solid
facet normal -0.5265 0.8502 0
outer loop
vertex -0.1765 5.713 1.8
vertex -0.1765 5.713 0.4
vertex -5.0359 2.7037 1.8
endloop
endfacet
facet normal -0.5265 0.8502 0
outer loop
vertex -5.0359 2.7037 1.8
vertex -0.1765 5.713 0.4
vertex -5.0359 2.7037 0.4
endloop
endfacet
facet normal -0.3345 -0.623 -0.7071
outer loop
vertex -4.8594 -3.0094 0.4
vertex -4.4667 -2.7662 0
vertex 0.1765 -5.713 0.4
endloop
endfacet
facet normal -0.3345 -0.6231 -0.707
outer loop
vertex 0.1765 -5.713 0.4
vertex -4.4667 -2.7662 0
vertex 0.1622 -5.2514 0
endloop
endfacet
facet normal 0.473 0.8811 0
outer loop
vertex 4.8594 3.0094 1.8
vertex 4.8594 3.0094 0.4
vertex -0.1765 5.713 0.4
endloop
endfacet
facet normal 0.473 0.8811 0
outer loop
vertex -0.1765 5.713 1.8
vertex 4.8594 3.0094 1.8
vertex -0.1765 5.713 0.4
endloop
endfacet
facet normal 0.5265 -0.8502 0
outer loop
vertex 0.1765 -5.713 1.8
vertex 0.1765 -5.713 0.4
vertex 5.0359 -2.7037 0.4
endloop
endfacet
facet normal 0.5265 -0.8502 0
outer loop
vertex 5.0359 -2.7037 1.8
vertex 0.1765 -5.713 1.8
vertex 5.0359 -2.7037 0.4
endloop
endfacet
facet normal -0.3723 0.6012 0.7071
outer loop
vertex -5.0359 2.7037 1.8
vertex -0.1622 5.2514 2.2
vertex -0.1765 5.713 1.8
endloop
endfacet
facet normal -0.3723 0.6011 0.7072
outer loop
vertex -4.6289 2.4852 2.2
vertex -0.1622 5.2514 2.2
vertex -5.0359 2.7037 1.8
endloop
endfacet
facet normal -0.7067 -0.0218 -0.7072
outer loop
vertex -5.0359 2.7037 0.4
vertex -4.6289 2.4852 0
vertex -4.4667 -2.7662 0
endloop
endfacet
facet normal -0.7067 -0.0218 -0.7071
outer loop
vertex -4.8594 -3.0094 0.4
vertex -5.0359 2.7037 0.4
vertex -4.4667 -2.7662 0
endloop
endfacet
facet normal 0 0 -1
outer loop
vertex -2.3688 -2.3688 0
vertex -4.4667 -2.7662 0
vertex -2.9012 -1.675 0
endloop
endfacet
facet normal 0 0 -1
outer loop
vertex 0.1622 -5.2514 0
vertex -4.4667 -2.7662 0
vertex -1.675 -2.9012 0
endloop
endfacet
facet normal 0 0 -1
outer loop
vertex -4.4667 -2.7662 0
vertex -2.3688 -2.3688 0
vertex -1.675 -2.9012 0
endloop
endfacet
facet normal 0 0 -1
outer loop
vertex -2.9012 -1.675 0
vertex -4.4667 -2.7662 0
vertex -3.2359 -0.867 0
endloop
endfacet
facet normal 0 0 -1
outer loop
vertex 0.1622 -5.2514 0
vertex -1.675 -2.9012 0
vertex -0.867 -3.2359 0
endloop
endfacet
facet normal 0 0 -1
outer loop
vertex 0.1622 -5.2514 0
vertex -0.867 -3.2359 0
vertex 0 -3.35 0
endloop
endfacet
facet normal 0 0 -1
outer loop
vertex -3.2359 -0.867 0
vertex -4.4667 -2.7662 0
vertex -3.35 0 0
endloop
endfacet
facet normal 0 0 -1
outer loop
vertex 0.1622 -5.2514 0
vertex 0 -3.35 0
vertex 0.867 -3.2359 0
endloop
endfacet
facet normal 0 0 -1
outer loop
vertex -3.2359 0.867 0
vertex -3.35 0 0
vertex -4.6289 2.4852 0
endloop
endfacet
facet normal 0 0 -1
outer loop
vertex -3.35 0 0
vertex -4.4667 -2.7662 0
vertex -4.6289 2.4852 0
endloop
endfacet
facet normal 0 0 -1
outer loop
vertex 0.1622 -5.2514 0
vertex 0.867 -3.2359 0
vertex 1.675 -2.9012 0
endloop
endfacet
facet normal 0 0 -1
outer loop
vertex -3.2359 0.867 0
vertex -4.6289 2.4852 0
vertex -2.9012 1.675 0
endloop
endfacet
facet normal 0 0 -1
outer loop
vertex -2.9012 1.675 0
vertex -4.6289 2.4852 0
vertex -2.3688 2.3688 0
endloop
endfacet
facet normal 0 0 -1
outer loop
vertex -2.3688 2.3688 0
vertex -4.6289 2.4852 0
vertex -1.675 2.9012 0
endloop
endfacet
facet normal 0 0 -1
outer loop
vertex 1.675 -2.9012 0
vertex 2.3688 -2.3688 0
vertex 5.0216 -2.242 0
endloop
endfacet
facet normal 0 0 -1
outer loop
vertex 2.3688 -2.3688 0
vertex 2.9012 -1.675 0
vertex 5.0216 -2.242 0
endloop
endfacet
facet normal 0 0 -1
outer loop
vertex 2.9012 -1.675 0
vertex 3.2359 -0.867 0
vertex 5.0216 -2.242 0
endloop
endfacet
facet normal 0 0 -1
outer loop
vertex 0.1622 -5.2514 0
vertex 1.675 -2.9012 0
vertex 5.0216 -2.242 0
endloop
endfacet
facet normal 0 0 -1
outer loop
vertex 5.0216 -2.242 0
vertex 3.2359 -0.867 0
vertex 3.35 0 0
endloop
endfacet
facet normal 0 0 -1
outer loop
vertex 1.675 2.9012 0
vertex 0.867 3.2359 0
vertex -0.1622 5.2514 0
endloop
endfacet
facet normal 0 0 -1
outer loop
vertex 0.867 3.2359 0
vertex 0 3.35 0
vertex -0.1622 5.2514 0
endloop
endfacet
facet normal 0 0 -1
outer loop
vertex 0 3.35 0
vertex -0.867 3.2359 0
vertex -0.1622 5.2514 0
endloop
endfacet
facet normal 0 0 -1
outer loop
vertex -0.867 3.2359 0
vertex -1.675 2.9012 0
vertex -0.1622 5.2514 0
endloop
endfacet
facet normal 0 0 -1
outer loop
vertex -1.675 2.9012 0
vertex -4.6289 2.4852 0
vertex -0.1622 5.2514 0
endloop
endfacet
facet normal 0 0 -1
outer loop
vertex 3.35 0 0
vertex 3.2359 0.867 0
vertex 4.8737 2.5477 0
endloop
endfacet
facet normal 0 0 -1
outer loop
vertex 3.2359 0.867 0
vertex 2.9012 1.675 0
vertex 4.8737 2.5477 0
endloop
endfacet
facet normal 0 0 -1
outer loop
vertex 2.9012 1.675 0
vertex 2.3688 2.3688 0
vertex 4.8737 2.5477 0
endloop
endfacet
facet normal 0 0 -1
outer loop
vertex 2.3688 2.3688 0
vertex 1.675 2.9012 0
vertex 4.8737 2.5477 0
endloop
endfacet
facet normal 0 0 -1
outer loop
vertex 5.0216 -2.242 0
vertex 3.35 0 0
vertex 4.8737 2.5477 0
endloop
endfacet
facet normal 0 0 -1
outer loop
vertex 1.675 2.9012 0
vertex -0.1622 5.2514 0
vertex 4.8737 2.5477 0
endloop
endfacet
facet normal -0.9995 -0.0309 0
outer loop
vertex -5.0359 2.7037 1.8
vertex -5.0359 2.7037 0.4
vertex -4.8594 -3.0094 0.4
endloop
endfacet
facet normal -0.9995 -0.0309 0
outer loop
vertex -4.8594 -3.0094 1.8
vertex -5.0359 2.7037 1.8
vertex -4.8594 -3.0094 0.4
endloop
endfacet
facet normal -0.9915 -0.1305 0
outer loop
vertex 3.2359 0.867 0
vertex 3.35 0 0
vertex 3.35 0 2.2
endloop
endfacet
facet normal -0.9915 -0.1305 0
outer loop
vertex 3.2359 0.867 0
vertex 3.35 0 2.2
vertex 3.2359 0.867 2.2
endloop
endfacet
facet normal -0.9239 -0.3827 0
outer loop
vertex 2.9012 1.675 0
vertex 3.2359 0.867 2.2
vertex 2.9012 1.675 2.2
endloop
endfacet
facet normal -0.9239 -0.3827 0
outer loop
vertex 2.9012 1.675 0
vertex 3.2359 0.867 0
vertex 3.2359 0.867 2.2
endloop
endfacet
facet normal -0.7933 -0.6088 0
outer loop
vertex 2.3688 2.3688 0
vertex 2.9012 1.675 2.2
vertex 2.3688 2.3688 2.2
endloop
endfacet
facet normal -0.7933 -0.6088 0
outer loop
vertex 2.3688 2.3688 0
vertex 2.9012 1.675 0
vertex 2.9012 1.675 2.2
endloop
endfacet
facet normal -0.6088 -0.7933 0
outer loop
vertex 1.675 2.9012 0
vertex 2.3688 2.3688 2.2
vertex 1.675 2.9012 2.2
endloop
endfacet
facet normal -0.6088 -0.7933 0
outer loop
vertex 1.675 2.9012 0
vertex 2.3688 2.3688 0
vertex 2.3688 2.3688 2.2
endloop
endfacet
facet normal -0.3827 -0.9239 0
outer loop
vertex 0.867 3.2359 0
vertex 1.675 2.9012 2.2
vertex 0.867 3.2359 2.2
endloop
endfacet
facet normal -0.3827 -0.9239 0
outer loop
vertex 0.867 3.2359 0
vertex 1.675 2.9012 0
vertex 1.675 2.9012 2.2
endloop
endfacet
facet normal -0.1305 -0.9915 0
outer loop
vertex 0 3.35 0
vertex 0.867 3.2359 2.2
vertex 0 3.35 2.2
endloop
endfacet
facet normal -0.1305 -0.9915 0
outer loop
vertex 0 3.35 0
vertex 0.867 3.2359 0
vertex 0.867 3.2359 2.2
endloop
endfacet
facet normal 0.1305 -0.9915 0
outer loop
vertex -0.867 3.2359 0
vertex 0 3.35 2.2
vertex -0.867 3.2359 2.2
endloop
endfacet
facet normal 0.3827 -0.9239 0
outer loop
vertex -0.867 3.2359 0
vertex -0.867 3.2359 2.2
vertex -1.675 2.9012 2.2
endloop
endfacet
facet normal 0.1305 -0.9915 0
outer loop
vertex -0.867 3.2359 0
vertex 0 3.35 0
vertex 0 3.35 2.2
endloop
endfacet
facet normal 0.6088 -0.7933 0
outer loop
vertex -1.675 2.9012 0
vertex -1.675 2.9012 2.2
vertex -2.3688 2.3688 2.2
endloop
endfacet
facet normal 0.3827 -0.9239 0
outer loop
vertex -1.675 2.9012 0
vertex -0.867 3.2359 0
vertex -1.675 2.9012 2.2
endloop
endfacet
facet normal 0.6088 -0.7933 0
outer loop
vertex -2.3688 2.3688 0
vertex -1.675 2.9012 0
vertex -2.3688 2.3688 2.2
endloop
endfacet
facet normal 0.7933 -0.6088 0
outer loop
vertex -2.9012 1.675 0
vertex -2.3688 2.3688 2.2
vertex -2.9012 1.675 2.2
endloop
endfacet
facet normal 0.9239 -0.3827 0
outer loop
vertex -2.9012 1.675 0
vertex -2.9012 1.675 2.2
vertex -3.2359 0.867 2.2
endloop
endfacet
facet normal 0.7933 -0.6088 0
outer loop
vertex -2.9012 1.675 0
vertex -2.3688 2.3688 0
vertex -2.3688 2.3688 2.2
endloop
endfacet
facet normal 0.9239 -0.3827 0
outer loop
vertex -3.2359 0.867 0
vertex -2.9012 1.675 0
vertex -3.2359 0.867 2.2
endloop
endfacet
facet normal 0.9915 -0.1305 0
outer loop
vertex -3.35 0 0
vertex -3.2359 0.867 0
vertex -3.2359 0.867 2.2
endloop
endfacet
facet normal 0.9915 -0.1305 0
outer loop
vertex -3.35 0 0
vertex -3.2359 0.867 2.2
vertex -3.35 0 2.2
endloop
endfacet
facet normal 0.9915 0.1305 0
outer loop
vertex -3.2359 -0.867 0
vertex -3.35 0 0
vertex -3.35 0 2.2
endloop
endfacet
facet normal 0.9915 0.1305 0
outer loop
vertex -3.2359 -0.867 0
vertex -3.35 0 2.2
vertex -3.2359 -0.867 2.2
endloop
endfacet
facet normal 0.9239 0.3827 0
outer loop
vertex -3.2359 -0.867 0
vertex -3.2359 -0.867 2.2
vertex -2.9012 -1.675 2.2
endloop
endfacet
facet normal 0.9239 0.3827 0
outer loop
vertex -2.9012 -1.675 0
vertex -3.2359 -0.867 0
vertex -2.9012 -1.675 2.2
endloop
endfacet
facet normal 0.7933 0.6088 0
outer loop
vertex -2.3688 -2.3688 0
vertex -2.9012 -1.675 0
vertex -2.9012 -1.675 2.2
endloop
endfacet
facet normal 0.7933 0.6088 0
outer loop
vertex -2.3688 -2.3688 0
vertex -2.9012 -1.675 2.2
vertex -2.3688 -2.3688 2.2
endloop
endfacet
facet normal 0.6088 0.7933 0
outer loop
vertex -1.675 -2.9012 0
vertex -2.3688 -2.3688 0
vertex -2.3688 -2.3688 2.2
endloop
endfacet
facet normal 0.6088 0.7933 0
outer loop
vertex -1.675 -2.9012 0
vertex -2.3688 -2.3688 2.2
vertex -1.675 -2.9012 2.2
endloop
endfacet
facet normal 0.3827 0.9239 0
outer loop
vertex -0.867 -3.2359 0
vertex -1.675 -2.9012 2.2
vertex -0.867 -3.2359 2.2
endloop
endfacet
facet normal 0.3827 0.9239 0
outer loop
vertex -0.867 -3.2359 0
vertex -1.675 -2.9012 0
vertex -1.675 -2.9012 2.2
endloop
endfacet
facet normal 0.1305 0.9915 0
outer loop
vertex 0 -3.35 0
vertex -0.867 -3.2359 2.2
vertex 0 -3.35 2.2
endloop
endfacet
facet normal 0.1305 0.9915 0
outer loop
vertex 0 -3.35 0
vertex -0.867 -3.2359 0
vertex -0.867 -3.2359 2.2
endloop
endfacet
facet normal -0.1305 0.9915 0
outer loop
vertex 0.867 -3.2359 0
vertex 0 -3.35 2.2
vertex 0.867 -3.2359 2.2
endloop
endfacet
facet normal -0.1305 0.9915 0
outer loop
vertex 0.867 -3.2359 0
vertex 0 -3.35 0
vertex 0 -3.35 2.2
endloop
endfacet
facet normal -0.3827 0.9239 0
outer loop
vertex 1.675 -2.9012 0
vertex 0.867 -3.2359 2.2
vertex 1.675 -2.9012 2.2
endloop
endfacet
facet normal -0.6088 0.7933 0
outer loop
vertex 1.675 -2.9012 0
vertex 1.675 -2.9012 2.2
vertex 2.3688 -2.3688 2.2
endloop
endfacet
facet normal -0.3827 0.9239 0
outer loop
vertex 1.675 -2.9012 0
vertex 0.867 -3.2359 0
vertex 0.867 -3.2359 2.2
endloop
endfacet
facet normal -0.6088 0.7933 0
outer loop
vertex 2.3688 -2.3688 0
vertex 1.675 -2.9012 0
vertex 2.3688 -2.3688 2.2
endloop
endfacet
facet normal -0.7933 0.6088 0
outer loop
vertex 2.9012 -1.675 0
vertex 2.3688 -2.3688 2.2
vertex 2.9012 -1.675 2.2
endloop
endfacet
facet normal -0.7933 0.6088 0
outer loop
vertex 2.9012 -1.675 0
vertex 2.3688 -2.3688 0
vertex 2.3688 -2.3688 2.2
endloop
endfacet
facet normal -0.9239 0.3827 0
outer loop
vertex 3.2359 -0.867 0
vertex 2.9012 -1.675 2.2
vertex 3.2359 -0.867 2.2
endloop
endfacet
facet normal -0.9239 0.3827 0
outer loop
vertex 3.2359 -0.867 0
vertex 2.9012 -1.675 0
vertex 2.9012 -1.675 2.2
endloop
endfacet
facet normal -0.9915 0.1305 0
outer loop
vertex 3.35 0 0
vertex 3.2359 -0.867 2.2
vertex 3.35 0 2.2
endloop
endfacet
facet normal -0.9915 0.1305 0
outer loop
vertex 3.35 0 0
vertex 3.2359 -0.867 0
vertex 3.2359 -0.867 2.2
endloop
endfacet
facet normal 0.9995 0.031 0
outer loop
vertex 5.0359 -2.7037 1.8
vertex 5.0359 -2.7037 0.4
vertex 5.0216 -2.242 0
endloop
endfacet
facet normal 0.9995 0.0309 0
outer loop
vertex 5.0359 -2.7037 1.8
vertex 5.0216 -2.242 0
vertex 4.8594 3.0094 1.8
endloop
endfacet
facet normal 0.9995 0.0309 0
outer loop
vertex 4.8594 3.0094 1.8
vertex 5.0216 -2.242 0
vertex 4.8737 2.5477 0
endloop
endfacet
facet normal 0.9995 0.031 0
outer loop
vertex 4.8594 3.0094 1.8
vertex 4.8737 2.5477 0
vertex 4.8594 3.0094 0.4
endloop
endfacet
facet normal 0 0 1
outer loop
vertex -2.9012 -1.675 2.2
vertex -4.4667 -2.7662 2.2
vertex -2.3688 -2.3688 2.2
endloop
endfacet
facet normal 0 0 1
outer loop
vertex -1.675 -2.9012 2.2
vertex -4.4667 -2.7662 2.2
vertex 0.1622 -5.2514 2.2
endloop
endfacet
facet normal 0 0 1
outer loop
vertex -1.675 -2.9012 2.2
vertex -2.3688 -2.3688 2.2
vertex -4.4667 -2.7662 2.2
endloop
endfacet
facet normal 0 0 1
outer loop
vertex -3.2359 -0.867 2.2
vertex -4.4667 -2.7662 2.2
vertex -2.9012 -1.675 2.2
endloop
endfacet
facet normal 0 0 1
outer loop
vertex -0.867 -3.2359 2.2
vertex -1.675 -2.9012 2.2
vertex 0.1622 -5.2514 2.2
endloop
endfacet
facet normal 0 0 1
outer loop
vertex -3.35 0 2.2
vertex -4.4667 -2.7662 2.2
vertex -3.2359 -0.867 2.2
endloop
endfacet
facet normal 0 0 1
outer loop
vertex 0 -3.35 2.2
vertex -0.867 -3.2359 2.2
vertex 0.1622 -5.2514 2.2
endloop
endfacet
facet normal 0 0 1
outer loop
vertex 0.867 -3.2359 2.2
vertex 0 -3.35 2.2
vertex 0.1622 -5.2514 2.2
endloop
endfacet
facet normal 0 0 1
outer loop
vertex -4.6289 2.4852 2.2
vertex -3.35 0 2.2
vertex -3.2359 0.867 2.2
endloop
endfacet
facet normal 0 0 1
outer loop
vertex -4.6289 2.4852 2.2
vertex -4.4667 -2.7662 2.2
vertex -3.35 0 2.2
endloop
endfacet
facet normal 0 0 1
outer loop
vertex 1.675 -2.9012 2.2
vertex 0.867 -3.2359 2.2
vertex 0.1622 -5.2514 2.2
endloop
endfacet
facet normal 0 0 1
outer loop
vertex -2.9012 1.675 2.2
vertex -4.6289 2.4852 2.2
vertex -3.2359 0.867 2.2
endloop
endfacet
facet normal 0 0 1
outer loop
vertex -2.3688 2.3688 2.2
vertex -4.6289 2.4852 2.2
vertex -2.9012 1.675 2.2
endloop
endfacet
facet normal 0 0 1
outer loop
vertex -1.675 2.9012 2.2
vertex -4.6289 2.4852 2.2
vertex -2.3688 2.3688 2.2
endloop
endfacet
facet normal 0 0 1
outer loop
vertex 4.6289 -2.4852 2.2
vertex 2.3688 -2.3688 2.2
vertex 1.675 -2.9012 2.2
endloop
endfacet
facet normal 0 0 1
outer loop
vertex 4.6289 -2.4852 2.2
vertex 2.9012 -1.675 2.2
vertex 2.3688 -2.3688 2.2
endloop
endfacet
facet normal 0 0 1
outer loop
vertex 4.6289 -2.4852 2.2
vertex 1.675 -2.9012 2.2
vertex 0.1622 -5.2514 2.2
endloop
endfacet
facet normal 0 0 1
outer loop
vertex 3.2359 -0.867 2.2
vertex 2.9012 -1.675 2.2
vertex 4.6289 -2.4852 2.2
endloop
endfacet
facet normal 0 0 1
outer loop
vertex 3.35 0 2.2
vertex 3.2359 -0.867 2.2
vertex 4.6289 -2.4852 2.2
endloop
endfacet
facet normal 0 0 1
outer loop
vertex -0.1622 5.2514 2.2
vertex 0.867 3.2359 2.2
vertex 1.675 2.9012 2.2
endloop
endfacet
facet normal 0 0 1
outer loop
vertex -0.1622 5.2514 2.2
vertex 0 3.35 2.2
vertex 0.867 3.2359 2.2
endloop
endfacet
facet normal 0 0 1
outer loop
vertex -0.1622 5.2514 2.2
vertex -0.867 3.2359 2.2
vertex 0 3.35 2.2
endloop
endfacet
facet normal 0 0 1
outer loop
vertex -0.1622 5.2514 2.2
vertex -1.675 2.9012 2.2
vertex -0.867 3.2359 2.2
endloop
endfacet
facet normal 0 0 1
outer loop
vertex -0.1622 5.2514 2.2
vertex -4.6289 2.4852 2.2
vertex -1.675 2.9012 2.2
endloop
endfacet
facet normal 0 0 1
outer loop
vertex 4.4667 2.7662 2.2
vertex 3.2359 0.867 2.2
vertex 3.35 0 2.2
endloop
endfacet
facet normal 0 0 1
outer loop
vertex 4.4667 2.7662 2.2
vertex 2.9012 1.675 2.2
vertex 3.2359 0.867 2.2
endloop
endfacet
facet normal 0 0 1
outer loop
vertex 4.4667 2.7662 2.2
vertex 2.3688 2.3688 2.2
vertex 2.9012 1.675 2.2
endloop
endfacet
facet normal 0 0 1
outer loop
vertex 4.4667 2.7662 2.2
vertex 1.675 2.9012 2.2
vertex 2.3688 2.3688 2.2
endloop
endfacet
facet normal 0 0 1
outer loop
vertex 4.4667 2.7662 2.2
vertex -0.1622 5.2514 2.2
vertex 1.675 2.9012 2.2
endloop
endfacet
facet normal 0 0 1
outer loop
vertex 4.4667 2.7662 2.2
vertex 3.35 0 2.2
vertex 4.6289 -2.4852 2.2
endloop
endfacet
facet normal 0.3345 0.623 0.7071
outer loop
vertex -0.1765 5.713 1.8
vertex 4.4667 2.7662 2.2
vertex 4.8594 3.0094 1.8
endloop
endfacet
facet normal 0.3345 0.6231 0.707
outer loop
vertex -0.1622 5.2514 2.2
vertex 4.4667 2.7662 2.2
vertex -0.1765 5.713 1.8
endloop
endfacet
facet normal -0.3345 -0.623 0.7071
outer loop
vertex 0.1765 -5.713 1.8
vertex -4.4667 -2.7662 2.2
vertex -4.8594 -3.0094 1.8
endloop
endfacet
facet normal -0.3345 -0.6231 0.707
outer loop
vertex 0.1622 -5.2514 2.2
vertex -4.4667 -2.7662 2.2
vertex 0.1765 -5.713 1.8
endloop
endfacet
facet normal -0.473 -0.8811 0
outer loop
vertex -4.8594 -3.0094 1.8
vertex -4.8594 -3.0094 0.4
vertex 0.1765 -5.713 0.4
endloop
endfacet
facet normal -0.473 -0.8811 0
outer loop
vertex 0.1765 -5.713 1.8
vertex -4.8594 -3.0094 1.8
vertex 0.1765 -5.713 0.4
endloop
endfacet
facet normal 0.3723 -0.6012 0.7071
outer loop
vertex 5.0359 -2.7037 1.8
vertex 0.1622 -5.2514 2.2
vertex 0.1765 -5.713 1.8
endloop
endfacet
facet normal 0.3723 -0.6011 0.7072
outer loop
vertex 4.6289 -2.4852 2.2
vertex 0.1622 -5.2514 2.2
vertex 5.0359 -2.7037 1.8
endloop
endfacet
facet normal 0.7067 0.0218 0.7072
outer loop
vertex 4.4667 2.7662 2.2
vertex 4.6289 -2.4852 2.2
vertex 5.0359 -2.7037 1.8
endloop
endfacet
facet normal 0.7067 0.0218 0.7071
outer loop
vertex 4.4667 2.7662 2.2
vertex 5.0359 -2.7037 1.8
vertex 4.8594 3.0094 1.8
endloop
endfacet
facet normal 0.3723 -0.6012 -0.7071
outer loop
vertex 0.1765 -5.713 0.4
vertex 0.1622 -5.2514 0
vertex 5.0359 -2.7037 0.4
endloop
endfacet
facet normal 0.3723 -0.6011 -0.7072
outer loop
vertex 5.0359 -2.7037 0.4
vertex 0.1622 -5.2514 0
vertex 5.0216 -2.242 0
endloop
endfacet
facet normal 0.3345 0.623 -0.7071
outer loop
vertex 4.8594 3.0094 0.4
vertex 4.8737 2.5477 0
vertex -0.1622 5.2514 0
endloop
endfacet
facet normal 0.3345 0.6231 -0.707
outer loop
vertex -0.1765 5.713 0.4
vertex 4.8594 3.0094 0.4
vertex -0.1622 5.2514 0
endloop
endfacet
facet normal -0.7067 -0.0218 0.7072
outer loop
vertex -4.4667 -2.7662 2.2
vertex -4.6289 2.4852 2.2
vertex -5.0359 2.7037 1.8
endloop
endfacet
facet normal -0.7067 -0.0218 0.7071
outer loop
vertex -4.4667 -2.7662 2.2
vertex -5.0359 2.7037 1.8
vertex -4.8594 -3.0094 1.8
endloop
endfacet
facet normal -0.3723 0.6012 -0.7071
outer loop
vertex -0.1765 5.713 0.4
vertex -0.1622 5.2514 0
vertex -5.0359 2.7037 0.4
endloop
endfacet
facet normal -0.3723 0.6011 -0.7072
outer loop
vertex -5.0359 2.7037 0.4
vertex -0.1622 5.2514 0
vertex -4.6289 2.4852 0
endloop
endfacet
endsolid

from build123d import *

# Parameters (mm, degrees)
SKETCH_1_R      = 3.35
EXTRUDE_1_DEPTH = 2.2
CHAMFER_1_SIZE  = 0.4


with BuildPart() as part:
    # 草图1 → 凸台-拉伸1 (new body)
    with BuildSketch(Plane.XY):
        Polygon((5.035878056, -2.703688629), (4.859402065, 3.009354013), (-0.176475992, 5.713042642), (-5.035878056, 2.703688629), (-4.859402065, -3.009354013), (0.176475992, -5.713042642), align=None)
        Circle(SKETCH_1_R, mode=Mode.SUBTRACT)
    extrude(amount=EXTRUDE_1_DEPTH)

    # 倒角1
    chamfer_1_edges = [part.edges().sort_by_distance(p)[0] for p in [
        (2.341463036, 4.361198327, 2.2),
        (-2.606177024, 4.208365635, 2.2),
        (-4.94764006, -0.152832692, 2.2),
        (-2.341463036, -4.361198327, 2.2),
        (2.606177024, -4.208365635, 2.2),
        (-2.341463036, -4.361198327, 0),
        (-4.94764006, -0.152832692, 0),
        (-2.606177024, 4.208365635, 0),
        (4.94764006, 0.152832692, 2.2),
        (2.341463036, 4.361198327, 0),
        (2.606177024, -4.208365635, 0),
    ]]
    chamfer(chamfer_1_edges, length=CHAMFER_1_SIZE)


solid = part.part
